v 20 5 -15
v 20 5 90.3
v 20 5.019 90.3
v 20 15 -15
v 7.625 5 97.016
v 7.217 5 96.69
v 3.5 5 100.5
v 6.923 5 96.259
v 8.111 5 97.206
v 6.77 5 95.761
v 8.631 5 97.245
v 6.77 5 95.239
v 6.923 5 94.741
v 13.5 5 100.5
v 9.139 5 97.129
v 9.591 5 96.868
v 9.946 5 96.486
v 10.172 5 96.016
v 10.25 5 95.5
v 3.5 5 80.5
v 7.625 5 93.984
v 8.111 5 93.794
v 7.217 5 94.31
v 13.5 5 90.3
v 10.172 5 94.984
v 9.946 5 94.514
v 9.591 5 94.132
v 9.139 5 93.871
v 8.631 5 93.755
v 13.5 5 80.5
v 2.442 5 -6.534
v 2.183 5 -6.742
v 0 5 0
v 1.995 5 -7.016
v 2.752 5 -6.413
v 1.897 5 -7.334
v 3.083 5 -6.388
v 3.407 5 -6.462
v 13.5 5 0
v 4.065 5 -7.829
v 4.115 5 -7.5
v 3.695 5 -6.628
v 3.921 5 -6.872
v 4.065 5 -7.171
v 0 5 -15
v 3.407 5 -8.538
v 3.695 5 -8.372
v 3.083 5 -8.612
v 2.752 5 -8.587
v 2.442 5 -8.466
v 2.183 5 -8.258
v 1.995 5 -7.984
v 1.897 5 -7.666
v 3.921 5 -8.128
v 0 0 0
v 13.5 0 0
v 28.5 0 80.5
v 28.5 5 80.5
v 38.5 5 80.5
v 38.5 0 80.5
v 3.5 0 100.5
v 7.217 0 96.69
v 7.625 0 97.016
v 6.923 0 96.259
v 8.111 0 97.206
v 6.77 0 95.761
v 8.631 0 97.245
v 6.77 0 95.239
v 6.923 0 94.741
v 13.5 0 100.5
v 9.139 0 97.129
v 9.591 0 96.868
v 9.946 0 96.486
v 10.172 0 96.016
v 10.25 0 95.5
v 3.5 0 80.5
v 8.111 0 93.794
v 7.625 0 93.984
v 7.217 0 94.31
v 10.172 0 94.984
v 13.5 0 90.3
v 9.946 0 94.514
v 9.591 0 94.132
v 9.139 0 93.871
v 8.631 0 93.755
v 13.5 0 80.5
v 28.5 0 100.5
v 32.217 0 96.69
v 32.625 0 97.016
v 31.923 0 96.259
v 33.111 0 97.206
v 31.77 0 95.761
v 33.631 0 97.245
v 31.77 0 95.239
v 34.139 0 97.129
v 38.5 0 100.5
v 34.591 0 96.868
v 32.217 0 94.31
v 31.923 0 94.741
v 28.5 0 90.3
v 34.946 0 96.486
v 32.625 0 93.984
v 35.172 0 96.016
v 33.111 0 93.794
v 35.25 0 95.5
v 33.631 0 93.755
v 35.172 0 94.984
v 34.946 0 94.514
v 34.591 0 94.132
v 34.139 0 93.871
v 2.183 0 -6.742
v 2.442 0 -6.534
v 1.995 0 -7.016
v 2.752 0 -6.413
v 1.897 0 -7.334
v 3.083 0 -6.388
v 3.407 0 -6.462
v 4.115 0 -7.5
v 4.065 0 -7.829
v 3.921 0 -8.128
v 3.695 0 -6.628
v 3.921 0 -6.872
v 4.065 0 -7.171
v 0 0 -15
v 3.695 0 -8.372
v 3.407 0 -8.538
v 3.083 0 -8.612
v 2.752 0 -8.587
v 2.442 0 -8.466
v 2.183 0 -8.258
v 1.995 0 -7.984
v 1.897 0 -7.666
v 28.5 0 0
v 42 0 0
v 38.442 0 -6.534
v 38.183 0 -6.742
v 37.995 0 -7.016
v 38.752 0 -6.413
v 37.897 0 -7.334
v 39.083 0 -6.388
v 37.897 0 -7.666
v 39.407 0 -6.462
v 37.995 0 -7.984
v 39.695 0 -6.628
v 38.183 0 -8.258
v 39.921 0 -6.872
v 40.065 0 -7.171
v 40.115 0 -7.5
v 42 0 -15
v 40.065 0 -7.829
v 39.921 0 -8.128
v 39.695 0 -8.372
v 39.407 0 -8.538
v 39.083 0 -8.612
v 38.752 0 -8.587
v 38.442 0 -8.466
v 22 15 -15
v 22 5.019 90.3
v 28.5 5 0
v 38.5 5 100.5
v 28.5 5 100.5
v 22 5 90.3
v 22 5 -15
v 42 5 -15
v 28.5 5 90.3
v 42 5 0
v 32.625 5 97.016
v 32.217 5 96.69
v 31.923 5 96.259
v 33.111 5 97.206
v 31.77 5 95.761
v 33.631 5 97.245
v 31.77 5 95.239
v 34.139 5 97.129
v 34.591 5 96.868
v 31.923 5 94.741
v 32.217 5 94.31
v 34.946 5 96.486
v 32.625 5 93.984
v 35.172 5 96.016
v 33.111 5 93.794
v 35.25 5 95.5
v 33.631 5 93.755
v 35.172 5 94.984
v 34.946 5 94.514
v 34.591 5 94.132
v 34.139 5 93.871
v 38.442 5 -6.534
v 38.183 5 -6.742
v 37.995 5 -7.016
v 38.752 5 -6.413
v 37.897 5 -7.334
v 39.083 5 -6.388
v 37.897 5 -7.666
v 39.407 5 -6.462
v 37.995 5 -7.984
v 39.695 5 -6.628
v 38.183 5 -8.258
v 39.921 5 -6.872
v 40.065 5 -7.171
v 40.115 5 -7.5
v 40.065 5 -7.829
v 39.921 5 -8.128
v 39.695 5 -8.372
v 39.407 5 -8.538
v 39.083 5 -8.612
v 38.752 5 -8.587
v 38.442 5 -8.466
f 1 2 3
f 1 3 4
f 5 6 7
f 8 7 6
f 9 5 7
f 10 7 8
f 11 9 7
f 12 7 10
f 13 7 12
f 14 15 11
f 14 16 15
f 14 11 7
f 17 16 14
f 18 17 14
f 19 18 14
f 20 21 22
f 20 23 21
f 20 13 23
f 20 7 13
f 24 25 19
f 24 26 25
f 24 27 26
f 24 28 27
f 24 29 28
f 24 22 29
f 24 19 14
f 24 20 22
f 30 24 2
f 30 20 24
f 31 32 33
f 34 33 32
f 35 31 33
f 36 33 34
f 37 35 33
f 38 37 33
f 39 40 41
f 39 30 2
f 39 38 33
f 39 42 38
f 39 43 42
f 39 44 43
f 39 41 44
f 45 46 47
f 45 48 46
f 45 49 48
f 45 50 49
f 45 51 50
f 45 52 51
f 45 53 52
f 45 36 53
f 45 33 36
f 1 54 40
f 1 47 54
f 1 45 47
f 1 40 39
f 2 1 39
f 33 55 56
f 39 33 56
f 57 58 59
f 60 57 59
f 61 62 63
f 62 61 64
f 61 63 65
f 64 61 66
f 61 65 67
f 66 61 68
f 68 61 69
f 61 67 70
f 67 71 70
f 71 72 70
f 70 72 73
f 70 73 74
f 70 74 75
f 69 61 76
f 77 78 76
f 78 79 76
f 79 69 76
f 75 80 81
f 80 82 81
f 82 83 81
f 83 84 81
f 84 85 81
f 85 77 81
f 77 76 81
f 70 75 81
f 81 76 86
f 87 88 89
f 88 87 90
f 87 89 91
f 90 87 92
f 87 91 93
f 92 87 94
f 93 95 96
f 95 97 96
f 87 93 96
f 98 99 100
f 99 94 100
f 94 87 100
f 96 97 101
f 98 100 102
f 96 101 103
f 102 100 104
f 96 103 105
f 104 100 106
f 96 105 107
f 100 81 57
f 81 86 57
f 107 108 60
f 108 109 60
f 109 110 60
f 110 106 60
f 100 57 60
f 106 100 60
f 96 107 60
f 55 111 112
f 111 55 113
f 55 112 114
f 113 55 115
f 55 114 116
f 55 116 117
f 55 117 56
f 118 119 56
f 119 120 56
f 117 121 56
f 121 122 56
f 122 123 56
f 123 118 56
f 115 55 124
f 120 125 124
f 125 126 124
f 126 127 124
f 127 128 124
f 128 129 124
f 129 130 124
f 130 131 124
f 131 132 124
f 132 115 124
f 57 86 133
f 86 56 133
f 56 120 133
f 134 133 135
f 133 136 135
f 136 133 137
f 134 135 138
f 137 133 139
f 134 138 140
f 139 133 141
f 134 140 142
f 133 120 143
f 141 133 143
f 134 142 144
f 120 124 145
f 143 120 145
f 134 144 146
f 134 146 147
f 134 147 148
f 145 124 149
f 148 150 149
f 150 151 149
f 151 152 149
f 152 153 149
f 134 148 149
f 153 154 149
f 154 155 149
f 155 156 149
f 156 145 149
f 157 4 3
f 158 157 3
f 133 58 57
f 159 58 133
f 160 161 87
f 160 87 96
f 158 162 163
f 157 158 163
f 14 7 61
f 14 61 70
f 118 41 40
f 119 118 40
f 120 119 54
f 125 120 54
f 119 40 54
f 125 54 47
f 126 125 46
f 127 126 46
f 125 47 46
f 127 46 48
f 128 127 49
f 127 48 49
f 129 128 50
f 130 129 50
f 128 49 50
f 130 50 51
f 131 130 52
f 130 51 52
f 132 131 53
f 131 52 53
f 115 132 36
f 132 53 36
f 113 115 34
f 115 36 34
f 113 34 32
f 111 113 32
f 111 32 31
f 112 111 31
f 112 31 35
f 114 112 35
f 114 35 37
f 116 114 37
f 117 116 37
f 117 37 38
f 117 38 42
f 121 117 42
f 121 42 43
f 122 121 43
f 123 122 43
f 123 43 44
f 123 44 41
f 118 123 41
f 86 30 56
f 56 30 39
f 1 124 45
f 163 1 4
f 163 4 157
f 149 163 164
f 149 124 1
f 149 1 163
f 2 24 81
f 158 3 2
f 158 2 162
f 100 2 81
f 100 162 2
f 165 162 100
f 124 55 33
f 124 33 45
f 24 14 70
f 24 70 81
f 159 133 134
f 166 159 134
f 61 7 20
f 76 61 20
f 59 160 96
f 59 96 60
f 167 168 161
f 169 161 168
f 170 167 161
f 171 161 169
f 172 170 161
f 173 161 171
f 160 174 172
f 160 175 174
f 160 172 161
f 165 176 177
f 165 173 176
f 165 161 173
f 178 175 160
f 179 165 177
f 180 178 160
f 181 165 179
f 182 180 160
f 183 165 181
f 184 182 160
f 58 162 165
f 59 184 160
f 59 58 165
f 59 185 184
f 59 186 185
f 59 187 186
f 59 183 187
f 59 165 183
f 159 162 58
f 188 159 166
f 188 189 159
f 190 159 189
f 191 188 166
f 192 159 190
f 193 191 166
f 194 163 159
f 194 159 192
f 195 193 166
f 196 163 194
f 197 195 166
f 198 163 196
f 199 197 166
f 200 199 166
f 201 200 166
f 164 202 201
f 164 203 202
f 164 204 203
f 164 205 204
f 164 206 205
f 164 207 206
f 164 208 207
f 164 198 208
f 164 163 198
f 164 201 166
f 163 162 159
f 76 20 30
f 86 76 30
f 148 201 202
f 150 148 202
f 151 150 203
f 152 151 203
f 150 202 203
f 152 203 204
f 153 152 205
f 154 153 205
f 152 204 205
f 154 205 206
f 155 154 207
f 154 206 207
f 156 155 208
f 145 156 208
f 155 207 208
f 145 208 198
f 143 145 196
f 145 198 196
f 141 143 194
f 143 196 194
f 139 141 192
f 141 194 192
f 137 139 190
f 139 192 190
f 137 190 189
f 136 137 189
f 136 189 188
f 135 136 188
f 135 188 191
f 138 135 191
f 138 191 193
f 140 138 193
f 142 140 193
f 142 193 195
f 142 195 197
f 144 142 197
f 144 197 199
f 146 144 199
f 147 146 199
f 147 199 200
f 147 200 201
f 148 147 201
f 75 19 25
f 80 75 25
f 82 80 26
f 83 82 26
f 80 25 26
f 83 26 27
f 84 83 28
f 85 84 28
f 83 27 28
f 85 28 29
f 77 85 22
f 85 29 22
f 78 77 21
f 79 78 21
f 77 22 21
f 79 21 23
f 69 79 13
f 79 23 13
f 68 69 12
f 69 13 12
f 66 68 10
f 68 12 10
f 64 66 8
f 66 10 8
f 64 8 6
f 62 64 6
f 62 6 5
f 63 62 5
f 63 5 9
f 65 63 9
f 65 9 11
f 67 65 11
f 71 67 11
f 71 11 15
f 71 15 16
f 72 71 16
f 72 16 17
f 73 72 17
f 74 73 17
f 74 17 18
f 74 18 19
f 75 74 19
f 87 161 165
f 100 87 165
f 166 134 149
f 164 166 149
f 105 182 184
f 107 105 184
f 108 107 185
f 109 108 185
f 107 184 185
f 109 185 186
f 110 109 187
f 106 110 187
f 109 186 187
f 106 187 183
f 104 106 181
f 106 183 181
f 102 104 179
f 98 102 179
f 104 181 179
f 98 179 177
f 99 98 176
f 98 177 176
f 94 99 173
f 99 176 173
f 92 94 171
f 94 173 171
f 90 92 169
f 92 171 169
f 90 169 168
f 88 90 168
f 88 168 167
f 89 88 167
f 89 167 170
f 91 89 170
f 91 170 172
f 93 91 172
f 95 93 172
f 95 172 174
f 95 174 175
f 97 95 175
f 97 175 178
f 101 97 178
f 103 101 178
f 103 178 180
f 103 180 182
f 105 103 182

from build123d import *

# Parameters (mm, degrees)
SKETCH1_W           = 42
SKETCH1_H           = 15
BOSS_EXTRUDE1_DEPTH = 5
SKETCH2_R           = 1.115
CUT_EXTRUDE1_DEPTH  = 6
SKETCH3_W           = 15
SKETCH3_H           = 80.5
BOSS_EXTRUDE2_DEPTH = 5
SKETCH4_W           = 35
SKETCH4_H           = 10
BOSS_EXTRUDE3_DEPTH = 5
SKETCH5_W           = 10
SKETCH5_H           = 10
BOSS_EXTRUDE4_DEPTH = 5
SKETCH6_R           = 1.75
CUT_EXTRUDE2_DEPTH  = 6
SKETCH7_W           = 15
SKETCH7_H           = 0.2
CUT_EXTRUDE3_DEPTH  = 6
SKETCH8_W           = 2
SKETCH8_H           = 105.3
BOSS_EXTRUDE5_DEPTH = 10
CUT_EXTRUDE4_DEPTH  = 23


with BuildPart() as part:
    # Sketch1 → Boss-Extrude1 (new body)
    with BuildSketch(Plane(origin=(0, 0, 0), x_dir=(1, 0, 0), z_dir=(0, 1, 0))):
        with Locations((21, 7.5)):
            Rectangle(SKETCH1_W, SKETCH1_H)
    extrude(amount=BOSS_EXTRUDE1_DEPTH)

    # Sketch2 → Cut-Extrude1 (cut, through all)
    with BuildSketch(Plane(origin=(0, 5, 0), x_dir=(1, 0, 0), z_dir=(0, 1, 0))):
        with Locations((3, 7.5)):
            Circle(SKETCH2_R)
        with Locations((39, 7.5)):
            Circle(SKETCH2_R)
    extrude(amount=-CUT_EXTRUDE1_DEPTH, mode=Mode.SUBTRACT)

    # Sketch3 → Boss-Extrude2 (add)
    with BuildSketch(Plane(origin=(0, 5, 0), x_dir=(1, 0, 0), z_dir=(0, 1, 0))):
        with Locations((21, -40.25)):
            Rectangle(SKETCH3_W, SKETCH3_H)
    extrude(amount=-BOSS_EXTRUDE2_DEPTH)

    # Sketch4 → Boss-Extrude3 (add)
    with BuildSketch(Plane(origin=(0, 5, 0), x_dir=(1, 0, 0), z_dir=(0, 1, 0))):
        with Locations((21, -85.5)):
            Rectangle(SKETCH4_W, SKETCH4_H)
    extrude(amount=-BOSS_EXTRUDE3_DEPTH)

    # Sketch5 → Boss-Extrude4 (add)
    with BuildSketch(Plane(origin=(0, 5, 0), x_dir=(1, 0, 0), z_dir=(0, 1, 0))):
        with Locations((8.5, -95.5)):
            Rectangle(SKETCH5_W, SKETCH5_H)
        with Locations((33.5, -95.5)):
            Rectangle(SKETCH5_W, SKETCH5_H)
    extrude(amount=-BOSS_EXTRUDE4_DEPTH)

    # Sketch6 → Cut-Extrude2 (cut, through all)
    with BuildSketch(Plane(origin=(0, 5, 0), x_dir=(1, 0, 0), z_dir=(0, 1, 0))):
        with Locations((8.5, -95.5)):
            Circle(SKETCH6_R)
        with Locations((33.5, -95.5)):
            Circle(SKETCH6_R)
    extrude(amount=-CUT_EXTRUDE2_DEPTH, mode=Mode.SUBTRACT)

    # Sketch7 → Cut-Extrude3 (cut, through all)
    with BuildSketch(Plane(origin=(0, 5, 0), x_dir=(1, 0, 0), z_dir=(0, 1, 0))):
        with Locations((21, -90.4)):
            Rectangle(SKETCH7_W, SKETCH7_H)
    extrude(amount=-CUT_EXTRUDE3_DEPTH, mode=Mode.SUBTRACT)

    # Sketch8 → Boss-Extrude5 (add)
    with BuildSketch(Plane(origin=(0, 5, 0), x_dir=(1, 0, 0), z_dir=(0, 1, 0))):
        with Locations((21, -37.65)):
            Rectangle(SKETCH8_W, SKETCH8_H)
    extrude(amount=BOSS_EXTRUDE5_DEPTH)

    # Sketch9 → Cut-Extrude4 (cut, through all)
    with BuildSketch(Plane.ZY.offset(-20)):
        Polygon((-15, 15), (90.5, 5), (90.3, 15), align=None)
    extrude(amount=-CUT_EXTRUDE4_DEPTH, mode=Mode.SUBTRACT)


solid = part.part
